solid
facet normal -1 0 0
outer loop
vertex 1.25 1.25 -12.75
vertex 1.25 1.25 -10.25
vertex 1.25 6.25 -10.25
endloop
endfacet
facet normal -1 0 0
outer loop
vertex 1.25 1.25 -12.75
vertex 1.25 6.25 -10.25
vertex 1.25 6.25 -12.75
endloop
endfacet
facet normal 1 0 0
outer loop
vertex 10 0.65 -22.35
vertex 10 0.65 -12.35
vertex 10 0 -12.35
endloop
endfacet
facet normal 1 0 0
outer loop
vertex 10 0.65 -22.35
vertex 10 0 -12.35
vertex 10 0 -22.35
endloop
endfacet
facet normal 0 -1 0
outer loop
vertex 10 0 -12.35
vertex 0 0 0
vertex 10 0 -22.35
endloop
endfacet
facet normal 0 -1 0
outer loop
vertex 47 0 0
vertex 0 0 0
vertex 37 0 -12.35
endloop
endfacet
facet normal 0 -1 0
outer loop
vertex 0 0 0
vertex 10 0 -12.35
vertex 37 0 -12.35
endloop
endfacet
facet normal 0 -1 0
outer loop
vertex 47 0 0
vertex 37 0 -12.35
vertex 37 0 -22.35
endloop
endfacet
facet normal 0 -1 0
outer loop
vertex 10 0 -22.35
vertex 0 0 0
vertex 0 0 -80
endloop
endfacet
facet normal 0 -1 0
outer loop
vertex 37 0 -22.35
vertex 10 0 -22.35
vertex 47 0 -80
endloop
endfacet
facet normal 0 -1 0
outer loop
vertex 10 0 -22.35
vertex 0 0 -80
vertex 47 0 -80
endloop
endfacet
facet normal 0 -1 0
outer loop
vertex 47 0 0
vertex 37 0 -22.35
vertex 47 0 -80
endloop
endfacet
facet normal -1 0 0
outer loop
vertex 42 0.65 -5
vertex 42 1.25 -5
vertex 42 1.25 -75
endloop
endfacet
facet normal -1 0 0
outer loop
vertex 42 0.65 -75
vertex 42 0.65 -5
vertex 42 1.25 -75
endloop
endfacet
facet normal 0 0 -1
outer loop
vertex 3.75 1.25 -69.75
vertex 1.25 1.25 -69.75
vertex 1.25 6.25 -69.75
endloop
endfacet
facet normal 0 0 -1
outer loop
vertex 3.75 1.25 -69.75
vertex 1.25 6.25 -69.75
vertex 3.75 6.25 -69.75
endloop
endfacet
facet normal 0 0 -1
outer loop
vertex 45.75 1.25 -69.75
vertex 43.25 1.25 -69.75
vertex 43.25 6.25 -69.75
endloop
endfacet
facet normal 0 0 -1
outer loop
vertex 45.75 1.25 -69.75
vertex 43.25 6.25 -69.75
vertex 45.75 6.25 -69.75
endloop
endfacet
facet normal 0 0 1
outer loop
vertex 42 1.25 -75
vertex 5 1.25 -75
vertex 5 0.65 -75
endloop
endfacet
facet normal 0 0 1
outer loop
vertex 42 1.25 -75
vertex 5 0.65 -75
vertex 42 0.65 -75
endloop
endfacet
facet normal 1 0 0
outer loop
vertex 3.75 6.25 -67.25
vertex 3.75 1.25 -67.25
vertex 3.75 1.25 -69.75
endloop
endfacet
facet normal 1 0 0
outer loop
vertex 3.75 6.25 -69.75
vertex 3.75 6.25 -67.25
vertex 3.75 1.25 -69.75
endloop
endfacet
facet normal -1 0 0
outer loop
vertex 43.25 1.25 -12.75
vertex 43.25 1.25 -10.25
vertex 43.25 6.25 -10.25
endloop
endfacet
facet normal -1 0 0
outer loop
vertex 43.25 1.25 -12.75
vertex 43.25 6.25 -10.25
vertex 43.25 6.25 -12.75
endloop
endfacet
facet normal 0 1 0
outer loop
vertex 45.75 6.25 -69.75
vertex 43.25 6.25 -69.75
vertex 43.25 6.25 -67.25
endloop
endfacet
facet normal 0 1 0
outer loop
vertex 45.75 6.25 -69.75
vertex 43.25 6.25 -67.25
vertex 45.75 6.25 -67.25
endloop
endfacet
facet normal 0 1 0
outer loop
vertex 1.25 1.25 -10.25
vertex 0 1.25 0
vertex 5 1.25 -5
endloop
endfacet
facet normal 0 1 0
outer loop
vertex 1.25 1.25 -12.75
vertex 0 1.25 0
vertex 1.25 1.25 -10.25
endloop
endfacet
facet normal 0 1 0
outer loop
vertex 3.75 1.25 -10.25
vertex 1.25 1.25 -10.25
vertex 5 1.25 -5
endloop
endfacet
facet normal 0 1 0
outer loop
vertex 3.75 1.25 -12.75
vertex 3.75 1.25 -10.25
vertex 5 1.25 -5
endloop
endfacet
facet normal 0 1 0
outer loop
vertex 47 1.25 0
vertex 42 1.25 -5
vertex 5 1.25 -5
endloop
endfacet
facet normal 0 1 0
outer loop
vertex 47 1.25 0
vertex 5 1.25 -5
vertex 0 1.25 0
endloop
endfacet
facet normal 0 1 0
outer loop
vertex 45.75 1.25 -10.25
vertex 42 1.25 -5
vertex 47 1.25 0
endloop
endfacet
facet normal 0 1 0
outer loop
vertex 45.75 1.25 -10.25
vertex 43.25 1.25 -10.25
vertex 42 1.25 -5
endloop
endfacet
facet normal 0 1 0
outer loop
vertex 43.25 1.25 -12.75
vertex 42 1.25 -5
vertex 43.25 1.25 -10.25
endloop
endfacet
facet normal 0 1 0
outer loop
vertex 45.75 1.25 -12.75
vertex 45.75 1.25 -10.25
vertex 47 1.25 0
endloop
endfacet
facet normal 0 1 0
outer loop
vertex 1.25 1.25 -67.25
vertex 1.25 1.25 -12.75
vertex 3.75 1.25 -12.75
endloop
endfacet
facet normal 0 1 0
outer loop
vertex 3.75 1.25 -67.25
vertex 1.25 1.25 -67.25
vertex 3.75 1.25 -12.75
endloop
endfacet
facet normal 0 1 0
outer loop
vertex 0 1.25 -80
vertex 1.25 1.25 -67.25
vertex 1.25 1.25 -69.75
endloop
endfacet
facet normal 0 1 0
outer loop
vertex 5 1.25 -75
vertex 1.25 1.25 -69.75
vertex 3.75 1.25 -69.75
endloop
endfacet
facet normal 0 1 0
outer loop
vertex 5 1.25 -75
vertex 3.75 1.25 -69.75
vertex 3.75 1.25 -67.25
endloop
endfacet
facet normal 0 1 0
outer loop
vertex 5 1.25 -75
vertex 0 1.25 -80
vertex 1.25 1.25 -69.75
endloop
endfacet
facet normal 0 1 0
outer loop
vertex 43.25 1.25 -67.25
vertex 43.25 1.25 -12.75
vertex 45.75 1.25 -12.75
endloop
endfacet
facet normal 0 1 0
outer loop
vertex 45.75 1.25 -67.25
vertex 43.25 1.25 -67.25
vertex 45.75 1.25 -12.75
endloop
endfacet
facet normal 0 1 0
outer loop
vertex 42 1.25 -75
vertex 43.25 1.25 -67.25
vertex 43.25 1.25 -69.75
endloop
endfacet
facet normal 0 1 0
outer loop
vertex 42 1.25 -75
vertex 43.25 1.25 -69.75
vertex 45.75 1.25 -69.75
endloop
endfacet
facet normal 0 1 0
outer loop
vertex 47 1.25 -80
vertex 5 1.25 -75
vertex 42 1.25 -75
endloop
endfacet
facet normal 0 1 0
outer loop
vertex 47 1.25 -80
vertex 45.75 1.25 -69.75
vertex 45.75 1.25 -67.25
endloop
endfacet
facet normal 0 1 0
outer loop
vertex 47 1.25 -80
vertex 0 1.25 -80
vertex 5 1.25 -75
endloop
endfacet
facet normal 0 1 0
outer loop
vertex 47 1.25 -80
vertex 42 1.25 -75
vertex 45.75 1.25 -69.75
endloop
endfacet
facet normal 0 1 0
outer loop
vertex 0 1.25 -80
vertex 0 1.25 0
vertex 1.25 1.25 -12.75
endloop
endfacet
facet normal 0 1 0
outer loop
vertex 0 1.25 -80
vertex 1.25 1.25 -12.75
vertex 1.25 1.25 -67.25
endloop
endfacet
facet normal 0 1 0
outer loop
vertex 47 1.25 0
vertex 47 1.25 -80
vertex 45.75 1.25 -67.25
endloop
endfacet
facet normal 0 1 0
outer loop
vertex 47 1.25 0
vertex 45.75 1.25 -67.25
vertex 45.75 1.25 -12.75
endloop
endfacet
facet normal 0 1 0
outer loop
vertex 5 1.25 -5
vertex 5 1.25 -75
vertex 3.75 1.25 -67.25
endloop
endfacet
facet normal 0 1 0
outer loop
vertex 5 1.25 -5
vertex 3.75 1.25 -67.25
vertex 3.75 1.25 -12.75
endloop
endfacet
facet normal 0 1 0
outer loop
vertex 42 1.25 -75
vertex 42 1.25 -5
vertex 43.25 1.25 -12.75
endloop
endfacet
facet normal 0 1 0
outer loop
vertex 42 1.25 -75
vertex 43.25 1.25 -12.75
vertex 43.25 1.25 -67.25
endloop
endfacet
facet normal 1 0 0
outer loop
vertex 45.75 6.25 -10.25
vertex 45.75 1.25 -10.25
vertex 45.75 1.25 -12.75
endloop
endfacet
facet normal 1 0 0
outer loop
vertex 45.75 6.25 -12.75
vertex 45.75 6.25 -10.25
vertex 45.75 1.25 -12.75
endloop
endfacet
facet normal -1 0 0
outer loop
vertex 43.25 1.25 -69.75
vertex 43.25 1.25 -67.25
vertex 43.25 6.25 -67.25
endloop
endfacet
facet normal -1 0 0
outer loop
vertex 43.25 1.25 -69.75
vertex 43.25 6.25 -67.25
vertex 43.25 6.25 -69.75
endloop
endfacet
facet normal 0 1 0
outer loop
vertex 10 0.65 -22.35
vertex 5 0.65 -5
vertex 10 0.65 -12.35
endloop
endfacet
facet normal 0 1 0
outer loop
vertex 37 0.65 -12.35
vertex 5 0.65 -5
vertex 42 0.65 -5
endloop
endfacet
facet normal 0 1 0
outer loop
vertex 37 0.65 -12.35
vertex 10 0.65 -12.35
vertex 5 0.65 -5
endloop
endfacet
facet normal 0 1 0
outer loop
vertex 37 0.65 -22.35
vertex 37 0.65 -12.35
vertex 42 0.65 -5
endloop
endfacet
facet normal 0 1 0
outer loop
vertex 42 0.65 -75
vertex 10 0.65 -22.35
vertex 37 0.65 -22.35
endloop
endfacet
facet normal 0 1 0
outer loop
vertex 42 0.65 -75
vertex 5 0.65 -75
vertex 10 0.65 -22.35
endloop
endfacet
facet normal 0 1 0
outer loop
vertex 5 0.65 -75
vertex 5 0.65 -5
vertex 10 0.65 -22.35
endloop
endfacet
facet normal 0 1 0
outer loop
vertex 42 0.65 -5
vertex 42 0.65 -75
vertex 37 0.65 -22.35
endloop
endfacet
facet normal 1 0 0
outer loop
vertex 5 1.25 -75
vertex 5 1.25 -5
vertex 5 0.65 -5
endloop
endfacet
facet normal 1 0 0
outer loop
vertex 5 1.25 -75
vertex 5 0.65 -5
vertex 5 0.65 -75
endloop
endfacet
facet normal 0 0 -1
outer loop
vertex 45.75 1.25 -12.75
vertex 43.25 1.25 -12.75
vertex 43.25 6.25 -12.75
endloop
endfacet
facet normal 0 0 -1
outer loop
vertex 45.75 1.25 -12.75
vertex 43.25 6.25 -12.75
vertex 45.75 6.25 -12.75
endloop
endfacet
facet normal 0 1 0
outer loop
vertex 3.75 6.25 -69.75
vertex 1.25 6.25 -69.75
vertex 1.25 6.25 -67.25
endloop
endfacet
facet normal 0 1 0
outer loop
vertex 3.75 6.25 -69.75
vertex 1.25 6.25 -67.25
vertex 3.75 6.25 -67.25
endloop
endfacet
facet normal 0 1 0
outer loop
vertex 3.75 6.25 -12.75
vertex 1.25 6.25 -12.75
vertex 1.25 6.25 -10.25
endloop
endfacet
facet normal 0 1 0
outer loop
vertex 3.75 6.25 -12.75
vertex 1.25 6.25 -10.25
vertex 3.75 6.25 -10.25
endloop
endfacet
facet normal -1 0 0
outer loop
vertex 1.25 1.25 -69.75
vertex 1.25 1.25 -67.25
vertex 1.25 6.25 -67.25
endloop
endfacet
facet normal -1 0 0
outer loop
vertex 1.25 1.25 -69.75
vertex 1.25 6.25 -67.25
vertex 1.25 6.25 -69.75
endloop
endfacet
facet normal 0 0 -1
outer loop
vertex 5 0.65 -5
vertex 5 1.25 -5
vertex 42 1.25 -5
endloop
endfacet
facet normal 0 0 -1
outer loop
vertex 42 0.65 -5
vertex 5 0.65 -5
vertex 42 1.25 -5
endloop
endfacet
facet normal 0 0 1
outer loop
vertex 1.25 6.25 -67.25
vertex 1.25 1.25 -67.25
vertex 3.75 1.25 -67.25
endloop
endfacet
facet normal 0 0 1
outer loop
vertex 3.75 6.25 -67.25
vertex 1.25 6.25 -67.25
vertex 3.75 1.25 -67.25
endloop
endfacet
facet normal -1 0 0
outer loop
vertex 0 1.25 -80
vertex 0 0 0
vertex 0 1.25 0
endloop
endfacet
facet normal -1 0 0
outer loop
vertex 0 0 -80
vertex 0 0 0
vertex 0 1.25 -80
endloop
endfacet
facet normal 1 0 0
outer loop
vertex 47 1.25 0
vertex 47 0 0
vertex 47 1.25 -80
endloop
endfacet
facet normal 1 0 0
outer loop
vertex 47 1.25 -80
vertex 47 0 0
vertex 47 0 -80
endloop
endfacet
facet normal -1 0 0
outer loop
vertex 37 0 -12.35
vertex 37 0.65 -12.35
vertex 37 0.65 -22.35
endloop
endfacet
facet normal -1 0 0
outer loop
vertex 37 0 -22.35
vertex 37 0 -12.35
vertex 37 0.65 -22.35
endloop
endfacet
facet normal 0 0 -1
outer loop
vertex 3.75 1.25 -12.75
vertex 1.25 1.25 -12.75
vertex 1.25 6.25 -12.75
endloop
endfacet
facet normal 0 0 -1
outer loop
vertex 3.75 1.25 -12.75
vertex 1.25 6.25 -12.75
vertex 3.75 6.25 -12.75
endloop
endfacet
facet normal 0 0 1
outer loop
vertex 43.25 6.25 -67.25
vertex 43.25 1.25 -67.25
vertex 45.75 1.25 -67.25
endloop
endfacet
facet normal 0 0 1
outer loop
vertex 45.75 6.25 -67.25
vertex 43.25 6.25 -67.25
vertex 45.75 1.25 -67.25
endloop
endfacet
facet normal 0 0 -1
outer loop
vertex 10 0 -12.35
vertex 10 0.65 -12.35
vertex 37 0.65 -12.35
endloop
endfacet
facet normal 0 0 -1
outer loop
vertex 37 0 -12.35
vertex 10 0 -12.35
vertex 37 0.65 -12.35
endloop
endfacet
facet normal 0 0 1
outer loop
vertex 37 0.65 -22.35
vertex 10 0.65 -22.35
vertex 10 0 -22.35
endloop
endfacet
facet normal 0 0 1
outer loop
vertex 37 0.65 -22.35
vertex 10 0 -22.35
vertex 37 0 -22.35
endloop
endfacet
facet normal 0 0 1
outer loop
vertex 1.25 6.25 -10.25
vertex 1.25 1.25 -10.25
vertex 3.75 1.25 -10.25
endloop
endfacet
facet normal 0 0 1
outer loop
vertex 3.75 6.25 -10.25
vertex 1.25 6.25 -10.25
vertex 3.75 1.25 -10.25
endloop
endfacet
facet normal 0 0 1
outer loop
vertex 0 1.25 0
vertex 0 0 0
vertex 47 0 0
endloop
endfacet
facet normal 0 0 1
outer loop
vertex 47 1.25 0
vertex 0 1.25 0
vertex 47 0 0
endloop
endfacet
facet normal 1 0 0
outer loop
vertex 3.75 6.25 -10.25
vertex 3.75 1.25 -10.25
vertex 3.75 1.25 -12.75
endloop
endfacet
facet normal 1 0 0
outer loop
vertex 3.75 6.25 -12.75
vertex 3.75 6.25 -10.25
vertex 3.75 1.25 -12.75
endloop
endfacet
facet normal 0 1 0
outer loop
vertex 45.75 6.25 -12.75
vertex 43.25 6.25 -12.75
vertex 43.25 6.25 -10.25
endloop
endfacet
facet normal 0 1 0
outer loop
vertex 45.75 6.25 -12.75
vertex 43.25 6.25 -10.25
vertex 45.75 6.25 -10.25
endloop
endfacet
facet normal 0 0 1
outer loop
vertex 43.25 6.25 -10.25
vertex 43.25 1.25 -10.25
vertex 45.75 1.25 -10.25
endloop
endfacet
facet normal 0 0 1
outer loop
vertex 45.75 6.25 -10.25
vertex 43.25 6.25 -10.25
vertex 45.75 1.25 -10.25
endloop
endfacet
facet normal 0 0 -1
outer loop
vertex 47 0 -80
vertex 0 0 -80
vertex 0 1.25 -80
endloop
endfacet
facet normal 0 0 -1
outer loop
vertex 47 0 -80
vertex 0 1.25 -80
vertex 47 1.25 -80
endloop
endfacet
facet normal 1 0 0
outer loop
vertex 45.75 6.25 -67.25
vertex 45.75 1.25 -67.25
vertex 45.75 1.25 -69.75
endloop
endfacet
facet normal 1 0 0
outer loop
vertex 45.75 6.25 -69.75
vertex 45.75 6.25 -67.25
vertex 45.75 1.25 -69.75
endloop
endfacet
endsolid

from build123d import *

# Parameters (mm, degrees)
SKETCH1_W           = 47
SKETCH1_H           = 80
BOSS_EXTRUDE1_DEPTH = 1.25
SKETCH2_W           = 2.5
SKETCH2_H           = 2.5
BOSS_EXTRUDE2_DEPTH = 5
SKETCH3_W           = 27
SKETCH3_H           = 10
CUT_EXTRUDE1_DEPTH  = 5
SKETCH6_W           = 37
SKETCH6_H           = 70
CUT_EXTRUDE2_DEPTH  = 0.6


with BuildPart() as part:
    # Sketch1 → Boss-Extrude1 (new body)
    with BuildSketch(Plane(origin=(0, 0, 0), x_dir=(1, 0, 0), z_dir=(0, 1, 0))):
        with Locations((23.5, 40)):
            Rectangle(SKETCH1_W, SKETCH1_H)
    extrude(amount=BOSS_EXTRUDE1_DEPTH)

    # Sketch2 → Boss-Extrude2 (add)
    with BuildSketch(Plane(origin=(0, 1.25, 0), x_dir=(1, 0, 0), z_dir=(0, 1, 0))):
        with Locations((44.5, 68.5)):
            Rectangle(SKETCH2_W, SKETCH2_H)
        with Locations((44.5, 11.5)):
            Rectangle(SKETCH2_W, SKETCH2_H)
        with Locations((2.5, 11.5)):
            Rectangle(SKETCH2_W, SKETCH2_H)
        with Locations((2.5, 68.5)):
            Rectangle(SKETCH2_W, SKETCH2_H)
    extrude(amount=BOSS_EXTRUDE2_DEPTH)

    # Sketch3 → Cut-Extrude1 (cut)
    with BuildSketch(Plane(origin=(0, 1.25, 0), x_dir=(1, 0, 0), z_dir=(0, 1, 0))):
        with Locations((23.5, 17.35)):
            Rectangle(SKETCH3_W, SKETCH3_H)
    extrude(amount=-CUT_EXTRUDE1_DEPTH, mode=Mode.SUBTRACT)

    # Sketch6 → Cut-Extrude2 (cut)
    with BuildSketch(Plane(origin=(0, 1.25, 0), x_dir=(1, 0, 0), z_dir=(0, 1, 0))):
        with Locations((23.5, 40)):
            Rectangle(SKETCH6_W, SKETCH6_H)
    extrude(amount=-CUT_EXTRUDE2_DEPTH, mode=Mode.SUBTRACT)


solid = part.part
